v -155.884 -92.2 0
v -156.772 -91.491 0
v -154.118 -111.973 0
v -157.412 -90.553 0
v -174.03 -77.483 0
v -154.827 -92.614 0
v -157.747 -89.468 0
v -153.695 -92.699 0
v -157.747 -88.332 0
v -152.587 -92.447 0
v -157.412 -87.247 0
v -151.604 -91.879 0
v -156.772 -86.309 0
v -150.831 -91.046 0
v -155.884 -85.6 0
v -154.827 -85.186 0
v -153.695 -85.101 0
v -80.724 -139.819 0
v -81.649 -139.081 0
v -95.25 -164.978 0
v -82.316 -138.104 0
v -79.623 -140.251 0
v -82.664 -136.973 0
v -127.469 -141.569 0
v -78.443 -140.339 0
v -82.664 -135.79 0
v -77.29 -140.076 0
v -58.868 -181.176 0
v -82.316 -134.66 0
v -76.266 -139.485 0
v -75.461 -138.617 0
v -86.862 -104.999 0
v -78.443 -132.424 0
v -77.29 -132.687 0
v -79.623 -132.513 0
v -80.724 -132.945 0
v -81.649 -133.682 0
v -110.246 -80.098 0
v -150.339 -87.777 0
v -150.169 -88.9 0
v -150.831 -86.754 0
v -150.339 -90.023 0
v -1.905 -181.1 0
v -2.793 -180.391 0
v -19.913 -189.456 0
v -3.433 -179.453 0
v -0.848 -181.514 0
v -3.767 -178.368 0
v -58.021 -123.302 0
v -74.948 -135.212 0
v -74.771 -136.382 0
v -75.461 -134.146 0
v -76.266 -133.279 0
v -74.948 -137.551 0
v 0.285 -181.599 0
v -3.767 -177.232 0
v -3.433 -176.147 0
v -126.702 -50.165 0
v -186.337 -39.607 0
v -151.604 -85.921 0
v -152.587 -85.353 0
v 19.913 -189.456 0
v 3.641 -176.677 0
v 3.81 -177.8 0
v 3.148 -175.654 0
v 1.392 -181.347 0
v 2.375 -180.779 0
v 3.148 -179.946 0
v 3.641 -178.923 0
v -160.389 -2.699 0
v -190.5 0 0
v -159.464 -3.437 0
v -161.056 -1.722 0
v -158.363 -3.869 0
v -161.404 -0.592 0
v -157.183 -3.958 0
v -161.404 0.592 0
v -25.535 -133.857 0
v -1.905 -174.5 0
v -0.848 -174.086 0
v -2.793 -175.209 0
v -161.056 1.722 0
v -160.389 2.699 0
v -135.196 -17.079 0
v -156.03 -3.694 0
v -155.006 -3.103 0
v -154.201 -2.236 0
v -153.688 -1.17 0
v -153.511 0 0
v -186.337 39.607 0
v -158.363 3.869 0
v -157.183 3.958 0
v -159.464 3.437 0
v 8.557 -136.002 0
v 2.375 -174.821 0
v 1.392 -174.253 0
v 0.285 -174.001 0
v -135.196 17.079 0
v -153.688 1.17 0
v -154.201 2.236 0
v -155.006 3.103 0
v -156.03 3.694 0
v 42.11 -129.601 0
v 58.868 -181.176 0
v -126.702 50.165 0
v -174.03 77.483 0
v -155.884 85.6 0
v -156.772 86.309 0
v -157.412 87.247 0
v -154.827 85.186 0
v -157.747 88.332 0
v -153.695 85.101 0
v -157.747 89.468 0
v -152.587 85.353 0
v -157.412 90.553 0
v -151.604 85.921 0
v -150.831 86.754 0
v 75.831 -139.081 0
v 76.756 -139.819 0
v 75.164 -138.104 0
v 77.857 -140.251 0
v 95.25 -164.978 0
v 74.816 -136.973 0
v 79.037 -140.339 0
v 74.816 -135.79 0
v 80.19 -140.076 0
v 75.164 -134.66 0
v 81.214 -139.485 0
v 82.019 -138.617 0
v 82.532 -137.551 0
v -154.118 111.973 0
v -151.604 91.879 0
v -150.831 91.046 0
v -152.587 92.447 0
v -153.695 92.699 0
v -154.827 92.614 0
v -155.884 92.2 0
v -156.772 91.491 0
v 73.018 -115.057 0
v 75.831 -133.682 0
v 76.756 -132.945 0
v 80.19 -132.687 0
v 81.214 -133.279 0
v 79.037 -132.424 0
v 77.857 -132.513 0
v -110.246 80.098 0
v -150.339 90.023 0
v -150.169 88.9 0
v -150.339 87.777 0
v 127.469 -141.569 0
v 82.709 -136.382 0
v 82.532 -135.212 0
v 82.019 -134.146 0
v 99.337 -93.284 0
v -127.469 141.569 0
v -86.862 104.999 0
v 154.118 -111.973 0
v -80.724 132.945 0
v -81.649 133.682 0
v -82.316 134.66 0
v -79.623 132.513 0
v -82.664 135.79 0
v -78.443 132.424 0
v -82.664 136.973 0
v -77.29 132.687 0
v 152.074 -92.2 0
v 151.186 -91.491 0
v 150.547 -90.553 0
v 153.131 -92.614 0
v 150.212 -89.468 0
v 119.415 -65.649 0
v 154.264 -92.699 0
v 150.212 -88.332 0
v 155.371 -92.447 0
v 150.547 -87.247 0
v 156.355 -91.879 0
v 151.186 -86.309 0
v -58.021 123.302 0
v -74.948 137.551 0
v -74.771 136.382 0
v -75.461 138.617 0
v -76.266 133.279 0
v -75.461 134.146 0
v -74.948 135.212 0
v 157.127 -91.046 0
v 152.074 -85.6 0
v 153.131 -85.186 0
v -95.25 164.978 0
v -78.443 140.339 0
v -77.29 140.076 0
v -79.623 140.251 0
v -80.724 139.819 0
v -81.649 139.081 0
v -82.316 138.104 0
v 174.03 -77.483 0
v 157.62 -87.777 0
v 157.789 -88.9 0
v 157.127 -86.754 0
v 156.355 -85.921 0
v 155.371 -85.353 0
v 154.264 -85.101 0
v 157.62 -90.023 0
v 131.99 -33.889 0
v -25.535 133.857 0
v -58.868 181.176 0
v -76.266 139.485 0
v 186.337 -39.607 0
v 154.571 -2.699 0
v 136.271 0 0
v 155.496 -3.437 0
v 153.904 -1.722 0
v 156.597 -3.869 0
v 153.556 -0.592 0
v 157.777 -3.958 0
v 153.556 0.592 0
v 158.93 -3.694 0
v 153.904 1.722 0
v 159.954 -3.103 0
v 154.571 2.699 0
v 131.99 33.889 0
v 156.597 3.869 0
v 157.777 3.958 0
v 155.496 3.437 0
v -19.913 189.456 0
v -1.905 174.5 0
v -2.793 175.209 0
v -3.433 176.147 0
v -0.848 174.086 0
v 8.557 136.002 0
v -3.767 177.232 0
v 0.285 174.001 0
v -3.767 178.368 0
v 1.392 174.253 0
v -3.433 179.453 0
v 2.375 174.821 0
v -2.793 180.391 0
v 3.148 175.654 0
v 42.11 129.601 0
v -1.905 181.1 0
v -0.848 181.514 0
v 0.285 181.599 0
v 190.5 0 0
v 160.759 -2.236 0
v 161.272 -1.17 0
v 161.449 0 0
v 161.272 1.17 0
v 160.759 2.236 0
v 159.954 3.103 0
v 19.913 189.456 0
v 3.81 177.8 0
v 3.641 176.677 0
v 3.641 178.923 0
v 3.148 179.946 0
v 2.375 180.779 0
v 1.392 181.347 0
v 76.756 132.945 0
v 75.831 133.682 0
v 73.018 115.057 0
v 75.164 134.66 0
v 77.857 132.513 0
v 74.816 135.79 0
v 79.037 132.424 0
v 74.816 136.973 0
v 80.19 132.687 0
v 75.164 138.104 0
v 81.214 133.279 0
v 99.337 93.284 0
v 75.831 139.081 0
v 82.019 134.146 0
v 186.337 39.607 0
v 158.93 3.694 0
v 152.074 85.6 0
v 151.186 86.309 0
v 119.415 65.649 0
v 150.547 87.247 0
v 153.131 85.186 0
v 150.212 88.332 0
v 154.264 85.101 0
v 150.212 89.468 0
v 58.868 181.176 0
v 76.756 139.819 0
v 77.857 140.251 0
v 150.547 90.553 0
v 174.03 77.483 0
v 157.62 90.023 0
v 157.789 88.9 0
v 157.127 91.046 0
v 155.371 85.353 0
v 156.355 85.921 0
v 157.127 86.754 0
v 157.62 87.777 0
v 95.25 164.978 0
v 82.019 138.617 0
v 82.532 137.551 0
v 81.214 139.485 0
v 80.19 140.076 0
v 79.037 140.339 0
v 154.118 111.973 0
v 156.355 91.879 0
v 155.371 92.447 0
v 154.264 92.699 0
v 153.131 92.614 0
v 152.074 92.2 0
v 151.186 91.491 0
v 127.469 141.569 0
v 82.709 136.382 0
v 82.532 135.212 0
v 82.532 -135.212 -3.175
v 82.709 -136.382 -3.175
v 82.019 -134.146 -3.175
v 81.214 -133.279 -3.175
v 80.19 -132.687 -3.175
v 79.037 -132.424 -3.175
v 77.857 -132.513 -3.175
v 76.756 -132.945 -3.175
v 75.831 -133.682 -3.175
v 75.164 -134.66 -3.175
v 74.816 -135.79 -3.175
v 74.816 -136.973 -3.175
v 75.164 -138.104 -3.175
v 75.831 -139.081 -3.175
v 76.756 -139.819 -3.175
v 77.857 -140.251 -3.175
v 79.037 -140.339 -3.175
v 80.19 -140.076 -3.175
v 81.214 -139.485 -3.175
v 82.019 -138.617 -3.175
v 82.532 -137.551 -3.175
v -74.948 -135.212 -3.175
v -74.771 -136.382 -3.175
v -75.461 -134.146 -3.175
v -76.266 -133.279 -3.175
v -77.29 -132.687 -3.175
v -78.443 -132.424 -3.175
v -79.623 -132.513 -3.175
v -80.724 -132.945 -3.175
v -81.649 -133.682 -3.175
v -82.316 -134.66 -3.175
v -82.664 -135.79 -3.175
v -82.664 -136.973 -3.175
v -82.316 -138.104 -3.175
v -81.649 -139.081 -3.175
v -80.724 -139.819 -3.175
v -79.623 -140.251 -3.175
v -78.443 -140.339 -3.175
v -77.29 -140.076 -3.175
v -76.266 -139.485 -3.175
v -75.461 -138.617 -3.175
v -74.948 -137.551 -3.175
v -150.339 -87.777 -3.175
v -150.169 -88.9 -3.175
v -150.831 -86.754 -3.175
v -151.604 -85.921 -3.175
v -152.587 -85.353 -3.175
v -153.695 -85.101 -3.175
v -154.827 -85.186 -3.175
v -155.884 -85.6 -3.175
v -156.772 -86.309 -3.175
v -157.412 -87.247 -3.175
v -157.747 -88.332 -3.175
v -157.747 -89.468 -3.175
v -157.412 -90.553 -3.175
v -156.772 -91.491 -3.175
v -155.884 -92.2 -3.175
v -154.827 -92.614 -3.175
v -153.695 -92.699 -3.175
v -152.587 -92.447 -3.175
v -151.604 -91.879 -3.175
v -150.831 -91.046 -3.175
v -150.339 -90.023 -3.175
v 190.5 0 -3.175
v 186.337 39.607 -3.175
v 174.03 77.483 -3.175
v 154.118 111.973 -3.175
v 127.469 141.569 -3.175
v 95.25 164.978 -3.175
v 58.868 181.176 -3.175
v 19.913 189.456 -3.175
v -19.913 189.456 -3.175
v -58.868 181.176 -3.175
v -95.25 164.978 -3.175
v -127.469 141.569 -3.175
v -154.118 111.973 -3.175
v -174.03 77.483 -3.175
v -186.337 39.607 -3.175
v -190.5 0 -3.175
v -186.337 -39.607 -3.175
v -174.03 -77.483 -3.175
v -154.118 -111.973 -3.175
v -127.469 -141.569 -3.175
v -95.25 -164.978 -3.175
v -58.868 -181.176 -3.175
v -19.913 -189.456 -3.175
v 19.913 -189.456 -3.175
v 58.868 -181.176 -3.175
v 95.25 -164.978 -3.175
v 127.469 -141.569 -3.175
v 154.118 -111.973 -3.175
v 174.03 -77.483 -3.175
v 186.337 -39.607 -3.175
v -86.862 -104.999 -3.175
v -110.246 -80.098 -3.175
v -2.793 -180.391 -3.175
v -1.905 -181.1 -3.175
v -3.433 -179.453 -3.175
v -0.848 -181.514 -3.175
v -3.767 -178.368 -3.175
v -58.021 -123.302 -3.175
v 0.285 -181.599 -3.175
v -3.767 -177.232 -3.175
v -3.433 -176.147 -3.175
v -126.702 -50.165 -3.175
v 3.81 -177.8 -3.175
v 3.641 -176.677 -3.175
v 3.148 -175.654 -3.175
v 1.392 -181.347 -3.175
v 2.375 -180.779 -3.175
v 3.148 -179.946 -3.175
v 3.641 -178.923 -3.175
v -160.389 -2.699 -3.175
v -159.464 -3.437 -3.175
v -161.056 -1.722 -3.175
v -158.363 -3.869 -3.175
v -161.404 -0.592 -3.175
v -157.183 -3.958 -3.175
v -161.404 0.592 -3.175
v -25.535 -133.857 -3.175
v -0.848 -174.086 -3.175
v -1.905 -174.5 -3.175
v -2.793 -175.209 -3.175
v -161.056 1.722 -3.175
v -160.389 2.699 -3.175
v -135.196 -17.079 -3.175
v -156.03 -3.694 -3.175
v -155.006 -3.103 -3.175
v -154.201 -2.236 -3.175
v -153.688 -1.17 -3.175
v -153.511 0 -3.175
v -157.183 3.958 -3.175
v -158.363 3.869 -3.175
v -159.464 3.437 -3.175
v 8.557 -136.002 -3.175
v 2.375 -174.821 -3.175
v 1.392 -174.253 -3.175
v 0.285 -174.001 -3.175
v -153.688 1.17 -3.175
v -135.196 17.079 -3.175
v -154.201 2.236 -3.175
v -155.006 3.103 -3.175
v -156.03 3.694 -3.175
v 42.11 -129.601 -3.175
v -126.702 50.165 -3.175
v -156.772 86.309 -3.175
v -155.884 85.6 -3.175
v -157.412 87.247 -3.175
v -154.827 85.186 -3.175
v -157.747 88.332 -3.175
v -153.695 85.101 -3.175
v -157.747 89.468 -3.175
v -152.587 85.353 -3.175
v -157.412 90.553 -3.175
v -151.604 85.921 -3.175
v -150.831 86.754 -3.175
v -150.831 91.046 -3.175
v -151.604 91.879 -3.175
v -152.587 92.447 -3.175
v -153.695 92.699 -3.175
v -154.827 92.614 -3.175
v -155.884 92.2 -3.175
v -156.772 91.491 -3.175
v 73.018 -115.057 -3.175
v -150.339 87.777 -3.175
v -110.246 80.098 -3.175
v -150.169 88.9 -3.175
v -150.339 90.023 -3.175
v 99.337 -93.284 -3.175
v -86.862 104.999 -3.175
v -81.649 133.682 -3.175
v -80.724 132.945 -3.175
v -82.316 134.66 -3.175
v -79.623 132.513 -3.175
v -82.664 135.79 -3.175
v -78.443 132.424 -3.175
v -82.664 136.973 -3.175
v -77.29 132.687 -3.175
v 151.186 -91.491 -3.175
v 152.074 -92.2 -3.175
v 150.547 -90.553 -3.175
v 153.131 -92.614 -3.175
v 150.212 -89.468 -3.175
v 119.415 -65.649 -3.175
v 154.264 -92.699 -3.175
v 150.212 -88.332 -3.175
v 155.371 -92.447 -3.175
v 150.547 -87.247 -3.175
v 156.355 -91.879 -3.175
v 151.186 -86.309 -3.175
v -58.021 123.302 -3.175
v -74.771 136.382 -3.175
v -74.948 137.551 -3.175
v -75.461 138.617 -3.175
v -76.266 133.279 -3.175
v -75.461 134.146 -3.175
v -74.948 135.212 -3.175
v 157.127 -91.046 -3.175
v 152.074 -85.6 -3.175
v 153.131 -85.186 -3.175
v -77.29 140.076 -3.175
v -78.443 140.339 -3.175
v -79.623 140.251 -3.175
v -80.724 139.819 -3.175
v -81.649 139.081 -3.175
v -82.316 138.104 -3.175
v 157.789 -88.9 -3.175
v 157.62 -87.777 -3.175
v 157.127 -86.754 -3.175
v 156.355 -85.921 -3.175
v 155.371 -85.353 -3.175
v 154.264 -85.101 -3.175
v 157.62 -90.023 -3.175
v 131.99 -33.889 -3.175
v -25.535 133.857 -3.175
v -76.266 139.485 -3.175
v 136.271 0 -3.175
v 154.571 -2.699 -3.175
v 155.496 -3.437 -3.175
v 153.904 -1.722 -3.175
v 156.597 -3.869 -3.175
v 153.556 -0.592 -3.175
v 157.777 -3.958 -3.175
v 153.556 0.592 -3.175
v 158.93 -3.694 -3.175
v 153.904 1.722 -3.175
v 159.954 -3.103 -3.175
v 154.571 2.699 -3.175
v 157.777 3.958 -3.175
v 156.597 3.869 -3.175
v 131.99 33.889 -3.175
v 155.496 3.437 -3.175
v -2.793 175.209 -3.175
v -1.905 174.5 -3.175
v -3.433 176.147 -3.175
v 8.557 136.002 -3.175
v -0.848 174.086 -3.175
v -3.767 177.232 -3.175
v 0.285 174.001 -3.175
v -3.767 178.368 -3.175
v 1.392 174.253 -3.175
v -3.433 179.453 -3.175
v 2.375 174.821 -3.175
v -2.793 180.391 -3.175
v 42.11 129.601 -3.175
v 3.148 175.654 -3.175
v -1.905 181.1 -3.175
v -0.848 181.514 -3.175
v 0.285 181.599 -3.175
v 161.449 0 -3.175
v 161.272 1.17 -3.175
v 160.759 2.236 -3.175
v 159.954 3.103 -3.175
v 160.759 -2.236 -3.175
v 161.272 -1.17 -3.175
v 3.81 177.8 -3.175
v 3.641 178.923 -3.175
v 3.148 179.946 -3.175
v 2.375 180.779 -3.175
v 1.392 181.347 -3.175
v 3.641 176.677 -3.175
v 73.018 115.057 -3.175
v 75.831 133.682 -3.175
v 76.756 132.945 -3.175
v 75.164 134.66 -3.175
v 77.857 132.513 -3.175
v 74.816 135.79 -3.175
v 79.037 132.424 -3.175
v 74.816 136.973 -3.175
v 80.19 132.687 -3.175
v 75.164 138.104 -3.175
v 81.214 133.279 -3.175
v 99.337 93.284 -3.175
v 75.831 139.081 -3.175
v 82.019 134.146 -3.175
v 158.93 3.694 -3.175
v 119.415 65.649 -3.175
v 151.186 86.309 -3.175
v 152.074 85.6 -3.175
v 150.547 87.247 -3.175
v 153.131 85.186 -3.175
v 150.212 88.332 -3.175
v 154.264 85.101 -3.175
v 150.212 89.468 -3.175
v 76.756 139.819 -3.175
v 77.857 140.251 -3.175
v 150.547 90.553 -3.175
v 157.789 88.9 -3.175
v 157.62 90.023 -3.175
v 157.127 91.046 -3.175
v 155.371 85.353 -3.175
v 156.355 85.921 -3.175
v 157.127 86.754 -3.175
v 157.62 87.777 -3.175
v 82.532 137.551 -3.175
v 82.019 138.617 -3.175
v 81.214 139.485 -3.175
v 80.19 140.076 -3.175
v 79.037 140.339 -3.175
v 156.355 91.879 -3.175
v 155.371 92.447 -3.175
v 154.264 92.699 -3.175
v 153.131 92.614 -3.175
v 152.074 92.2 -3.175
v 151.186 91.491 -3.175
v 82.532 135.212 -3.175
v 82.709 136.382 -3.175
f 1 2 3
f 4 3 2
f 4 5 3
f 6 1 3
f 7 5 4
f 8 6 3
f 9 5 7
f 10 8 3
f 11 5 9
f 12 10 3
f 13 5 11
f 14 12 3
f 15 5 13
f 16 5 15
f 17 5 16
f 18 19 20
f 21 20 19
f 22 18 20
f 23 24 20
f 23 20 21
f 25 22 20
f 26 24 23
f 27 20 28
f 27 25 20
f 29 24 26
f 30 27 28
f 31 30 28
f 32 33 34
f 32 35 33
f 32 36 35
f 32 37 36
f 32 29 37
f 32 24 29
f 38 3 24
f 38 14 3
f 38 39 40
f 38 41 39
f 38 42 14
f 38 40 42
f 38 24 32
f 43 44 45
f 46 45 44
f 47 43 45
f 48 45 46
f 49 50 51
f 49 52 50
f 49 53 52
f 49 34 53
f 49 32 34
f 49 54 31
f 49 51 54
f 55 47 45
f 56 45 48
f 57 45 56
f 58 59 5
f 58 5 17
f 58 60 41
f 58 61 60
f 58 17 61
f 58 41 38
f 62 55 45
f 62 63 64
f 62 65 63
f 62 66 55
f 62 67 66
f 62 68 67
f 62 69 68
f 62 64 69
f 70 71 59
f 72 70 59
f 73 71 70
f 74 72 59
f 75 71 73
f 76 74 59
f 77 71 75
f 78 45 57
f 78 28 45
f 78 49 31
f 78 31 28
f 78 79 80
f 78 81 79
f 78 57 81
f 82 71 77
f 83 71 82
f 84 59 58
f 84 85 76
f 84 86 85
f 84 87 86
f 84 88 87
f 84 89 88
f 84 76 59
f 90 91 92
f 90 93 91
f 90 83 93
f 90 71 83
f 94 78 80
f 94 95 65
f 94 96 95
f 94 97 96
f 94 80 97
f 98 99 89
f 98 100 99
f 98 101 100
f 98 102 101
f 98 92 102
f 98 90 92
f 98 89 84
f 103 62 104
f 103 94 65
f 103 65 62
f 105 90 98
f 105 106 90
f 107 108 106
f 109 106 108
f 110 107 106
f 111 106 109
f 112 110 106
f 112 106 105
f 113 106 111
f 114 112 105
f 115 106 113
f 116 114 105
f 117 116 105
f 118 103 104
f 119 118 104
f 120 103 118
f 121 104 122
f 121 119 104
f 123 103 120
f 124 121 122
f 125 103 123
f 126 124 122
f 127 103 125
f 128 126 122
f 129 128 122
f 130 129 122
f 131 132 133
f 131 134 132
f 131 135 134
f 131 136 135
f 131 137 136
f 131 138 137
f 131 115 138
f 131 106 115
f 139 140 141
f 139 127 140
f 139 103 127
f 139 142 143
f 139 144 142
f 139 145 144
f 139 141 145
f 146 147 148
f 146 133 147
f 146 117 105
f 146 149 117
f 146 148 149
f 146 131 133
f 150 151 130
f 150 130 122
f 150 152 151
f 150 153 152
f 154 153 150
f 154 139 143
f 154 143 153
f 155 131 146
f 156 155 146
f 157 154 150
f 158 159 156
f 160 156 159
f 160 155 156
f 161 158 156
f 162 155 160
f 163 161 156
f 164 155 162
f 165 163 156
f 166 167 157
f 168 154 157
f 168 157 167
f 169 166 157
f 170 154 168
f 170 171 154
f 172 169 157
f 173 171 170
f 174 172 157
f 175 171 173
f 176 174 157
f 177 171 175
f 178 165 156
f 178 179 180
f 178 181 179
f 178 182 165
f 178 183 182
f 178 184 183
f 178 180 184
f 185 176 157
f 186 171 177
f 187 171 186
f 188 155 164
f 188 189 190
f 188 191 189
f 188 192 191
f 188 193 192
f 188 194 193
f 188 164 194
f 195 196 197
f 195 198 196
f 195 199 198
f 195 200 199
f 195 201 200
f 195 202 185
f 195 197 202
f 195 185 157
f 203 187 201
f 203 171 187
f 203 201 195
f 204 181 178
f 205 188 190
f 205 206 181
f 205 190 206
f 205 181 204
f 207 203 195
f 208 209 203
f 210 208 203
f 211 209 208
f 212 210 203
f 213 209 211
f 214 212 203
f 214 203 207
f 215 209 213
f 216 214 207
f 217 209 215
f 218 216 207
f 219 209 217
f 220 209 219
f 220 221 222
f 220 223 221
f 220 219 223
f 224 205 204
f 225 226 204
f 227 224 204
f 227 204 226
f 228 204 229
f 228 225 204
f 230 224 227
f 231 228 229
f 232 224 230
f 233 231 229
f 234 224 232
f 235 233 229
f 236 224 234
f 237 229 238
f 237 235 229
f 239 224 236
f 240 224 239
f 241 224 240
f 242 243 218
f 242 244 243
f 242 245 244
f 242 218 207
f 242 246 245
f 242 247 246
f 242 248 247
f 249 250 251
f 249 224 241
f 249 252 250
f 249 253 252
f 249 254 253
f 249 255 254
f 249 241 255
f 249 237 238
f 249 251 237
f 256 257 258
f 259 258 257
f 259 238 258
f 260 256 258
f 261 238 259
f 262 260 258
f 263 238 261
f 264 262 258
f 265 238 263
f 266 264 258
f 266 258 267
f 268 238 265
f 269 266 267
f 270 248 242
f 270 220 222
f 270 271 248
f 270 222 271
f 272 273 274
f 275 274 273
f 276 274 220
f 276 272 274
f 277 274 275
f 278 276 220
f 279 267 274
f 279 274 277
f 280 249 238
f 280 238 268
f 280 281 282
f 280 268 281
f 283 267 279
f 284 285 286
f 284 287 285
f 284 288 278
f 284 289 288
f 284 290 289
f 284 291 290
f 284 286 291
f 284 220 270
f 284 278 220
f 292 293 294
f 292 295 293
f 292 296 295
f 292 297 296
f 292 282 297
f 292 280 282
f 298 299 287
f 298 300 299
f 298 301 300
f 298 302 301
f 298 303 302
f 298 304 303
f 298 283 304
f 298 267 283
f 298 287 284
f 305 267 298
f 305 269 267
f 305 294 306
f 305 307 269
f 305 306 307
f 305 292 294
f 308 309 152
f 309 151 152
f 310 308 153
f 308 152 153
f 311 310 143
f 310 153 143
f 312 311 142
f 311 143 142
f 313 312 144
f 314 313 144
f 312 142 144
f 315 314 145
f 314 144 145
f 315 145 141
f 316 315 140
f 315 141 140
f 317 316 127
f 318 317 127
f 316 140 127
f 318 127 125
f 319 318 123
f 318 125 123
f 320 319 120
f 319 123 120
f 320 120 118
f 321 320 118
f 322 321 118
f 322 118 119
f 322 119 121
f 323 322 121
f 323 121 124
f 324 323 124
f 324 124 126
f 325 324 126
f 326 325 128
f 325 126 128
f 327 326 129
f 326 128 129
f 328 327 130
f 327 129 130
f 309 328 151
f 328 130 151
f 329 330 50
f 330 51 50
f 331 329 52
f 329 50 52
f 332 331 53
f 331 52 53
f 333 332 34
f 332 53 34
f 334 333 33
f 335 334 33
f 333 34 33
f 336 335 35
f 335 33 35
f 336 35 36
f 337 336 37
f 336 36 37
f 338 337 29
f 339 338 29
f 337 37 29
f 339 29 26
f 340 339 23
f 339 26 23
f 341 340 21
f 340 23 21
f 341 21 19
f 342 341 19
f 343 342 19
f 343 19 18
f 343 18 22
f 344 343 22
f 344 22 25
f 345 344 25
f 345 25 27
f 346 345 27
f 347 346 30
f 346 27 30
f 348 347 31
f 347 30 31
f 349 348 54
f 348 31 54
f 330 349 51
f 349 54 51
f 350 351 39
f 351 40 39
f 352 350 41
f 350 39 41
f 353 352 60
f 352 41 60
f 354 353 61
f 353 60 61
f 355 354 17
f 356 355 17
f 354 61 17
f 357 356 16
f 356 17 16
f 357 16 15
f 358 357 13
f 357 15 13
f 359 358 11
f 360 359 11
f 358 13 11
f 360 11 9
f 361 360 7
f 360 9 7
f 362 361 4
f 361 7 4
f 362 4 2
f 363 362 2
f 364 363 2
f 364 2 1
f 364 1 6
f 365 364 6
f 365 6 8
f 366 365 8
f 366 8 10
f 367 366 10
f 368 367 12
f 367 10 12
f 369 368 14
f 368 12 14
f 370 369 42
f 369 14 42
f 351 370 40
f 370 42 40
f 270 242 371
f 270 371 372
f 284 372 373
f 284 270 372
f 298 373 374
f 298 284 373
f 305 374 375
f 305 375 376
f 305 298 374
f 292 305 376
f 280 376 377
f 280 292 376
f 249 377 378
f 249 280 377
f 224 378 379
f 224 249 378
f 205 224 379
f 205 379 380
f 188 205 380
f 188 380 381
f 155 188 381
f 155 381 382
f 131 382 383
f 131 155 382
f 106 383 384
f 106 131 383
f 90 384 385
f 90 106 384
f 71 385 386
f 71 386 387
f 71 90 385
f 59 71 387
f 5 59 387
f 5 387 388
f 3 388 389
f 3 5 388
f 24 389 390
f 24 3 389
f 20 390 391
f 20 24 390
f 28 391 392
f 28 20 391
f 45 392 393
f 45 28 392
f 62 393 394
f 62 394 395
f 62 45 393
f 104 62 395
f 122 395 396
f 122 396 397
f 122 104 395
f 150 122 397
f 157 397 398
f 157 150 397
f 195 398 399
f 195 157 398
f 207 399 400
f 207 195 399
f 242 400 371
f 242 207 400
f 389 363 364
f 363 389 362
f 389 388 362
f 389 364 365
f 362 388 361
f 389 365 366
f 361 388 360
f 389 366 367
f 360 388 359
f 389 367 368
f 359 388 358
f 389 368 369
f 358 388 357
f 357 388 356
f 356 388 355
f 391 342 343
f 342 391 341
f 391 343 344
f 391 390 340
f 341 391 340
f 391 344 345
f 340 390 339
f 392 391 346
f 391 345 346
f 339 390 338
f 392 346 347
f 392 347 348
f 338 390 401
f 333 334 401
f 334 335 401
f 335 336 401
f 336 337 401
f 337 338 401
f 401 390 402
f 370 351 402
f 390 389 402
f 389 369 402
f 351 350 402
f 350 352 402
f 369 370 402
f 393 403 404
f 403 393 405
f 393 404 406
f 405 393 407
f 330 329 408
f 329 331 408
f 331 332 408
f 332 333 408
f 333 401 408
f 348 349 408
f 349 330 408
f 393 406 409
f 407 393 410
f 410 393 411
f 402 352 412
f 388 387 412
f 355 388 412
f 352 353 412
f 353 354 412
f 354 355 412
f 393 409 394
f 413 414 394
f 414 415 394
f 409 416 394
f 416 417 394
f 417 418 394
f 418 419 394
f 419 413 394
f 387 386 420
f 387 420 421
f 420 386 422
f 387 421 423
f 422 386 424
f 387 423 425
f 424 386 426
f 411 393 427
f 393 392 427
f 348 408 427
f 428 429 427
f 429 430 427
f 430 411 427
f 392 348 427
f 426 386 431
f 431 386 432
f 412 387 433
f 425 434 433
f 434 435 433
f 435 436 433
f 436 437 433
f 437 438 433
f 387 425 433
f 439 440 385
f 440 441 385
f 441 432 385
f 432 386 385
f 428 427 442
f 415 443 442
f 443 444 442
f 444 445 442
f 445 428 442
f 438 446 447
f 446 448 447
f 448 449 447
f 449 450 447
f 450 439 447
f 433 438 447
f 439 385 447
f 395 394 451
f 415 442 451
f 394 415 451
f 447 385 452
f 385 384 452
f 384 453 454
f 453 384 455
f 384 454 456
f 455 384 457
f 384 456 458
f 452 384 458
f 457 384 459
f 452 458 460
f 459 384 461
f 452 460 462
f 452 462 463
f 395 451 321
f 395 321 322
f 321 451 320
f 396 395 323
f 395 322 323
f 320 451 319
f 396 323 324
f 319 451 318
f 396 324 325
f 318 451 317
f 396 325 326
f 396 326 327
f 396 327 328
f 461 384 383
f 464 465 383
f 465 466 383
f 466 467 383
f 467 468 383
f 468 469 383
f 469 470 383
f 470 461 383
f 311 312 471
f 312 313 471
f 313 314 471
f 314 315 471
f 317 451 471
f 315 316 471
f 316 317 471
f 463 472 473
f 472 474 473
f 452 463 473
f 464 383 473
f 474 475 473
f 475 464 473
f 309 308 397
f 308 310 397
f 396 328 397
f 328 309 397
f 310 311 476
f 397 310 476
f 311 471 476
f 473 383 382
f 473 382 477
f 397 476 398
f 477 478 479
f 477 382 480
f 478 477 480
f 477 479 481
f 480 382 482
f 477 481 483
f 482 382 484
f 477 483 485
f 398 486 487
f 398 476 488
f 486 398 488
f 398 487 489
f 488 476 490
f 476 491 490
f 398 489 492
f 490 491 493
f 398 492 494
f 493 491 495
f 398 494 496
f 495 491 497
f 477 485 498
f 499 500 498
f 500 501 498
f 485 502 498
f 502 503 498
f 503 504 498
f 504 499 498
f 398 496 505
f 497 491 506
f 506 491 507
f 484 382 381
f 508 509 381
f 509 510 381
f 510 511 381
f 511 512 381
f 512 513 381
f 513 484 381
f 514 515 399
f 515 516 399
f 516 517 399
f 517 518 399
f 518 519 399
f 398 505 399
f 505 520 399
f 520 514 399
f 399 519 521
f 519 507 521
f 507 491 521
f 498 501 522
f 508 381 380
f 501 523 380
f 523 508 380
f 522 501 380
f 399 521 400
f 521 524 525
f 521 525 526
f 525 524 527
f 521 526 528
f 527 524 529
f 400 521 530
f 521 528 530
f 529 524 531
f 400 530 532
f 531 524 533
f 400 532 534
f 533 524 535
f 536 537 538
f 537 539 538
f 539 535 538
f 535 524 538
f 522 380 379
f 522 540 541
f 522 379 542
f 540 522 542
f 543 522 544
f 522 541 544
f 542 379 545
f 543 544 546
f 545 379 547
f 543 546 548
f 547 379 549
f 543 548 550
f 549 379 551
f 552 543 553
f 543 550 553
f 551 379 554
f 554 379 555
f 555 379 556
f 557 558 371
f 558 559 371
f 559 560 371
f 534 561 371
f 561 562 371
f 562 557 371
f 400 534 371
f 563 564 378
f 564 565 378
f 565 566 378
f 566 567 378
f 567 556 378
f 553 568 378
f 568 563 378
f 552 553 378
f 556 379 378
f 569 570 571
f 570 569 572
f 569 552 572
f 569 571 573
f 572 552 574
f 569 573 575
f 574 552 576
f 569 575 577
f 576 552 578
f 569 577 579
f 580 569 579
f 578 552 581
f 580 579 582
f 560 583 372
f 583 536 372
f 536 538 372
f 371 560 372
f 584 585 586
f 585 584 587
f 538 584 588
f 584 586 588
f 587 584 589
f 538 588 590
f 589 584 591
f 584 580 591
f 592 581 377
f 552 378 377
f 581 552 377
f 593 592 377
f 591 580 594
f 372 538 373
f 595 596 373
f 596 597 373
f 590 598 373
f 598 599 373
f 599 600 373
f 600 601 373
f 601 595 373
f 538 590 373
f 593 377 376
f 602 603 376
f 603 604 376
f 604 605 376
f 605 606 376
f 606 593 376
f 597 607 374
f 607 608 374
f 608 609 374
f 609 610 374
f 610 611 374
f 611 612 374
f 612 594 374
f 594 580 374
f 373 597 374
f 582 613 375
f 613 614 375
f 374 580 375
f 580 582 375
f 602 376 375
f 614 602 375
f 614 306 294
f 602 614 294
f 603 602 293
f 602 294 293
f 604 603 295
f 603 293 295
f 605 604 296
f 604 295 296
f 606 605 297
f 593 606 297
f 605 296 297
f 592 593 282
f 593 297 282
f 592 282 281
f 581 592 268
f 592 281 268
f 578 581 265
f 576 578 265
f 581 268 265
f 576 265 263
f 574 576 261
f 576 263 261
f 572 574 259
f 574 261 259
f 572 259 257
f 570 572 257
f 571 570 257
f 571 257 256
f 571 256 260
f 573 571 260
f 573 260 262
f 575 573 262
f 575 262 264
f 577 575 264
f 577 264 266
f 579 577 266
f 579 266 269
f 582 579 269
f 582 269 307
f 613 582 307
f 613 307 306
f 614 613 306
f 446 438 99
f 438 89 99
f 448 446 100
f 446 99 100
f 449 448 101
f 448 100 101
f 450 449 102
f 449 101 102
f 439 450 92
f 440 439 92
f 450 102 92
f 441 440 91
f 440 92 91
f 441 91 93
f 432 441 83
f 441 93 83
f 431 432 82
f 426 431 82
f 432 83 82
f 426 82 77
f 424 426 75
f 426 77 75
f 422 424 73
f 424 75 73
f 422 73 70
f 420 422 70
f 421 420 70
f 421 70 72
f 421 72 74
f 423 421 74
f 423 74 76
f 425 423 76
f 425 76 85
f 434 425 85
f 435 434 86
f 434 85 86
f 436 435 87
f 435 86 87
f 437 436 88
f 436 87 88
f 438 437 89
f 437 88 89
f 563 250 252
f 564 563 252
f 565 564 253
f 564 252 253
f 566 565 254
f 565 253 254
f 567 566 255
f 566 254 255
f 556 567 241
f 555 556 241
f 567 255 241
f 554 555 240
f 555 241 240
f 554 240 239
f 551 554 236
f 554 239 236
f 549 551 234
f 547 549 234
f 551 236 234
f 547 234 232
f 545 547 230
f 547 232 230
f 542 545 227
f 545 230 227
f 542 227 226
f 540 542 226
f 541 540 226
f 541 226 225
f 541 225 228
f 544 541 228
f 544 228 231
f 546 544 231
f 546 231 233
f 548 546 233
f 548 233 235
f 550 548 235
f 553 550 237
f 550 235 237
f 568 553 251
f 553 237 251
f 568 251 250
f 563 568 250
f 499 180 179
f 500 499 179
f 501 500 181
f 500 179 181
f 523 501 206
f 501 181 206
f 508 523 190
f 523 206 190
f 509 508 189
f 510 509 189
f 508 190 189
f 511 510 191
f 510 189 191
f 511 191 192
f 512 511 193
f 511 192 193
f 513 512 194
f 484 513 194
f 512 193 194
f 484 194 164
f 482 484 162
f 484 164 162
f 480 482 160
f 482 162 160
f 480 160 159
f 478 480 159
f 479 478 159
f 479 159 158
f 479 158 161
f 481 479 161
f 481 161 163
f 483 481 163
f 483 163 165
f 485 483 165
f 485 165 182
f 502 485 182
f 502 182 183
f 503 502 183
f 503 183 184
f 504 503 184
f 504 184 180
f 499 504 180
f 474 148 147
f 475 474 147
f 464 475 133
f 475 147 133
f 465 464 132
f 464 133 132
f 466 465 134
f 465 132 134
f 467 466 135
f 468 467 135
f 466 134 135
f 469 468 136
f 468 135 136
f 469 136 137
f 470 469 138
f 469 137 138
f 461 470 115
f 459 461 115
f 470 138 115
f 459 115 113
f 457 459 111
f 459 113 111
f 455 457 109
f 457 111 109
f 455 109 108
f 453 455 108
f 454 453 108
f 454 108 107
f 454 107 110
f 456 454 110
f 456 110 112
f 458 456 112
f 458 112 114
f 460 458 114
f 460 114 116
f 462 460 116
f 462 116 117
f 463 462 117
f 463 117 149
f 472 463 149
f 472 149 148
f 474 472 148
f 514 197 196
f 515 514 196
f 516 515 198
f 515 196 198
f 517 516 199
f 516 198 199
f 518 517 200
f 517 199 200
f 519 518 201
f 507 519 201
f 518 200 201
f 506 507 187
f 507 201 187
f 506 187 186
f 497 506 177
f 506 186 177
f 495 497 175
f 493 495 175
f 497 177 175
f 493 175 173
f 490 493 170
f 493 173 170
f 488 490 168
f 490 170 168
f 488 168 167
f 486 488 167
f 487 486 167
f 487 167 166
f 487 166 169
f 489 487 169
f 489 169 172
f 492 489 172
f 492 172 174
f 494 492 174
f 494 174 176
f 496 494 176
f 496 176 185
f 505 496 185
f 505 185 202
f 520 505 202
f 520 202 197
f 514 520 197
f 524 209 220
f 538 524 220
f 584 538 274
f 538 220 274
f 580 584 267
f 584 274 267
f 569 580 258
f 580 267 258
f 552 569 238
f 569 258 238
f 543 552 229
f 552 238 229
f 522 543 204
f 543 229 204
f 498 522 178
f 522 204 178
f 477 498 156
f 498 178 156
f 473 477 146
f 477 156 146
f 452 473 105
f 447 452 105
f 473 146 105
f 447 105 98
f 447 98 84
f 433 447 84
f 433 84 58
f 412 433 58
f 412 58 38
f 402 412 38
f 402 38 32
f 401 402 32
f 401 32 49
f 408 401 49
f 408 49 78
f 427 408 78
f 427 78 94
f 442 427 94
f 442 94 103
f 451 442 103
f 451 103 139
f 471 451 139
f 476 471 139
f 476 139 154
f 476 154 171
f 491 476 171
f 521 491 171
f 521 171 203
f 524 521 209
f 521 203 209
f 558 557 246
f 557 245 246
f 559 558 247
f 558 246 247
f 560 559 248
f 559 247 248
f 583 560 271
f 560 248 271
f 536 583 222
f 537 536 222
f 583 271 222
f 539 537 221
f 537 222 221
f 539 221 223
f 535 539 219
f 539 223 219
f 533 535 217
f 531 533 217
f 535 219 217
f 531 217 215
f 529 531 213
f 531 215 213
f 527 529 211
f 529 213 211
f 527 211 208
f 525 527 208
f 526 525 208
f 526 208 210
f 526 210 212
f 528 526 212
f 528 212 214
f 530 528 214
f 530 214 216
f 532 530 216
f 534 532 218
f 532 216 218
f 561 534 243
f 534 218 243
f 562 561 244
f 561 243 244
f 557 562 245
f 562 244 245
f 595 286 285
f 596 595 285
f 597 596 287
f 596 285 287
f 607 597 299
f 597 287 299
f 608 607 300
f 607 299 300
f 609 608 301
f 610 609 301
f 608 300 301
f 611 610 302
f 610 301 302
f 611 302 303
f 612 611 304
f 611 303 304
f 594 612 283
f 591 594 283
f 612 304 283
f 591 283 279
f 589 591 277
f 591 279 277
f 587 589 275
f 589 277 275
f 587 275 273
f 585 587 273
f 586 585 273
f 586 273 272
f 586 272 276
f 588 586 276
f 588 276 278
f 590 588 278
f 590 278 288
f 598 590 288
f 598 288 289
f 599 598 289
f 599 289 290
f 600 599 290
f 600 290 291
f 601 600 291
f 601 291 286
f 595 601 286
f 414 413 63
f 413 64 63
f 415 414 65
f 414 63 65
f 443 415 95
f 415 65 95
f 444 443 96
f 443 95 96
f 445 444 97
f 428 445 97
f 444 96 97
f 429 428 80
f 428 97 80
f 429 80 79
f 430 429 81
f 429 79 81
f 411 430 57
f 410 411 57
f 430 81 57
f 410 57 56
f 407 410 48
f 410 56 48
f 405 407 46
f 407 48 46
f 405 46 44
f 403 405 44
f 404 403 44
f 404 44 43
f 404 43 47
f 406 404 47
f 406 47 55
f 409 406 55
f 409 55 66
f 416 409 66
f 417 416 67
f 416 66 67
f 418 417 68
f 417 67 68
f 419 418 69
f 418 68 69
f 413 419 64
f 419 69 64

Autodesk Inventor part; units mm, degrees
ref_plane "YZ Plane" through (0, 0, 0) normal (1, 0, 0) x (0, 1, 0)
ref_plane "XZ Plane" through (0, 0, 0) normal (0, 1, 0) x (-1, 0, 0)
ref_plane "XY Plane" through (0, 0, 0) normal (0, 0, 1) x (1, 0, 0)
sketch "Sketch1" plane through (0, 0, 0) normal (0, 0, 1) x (1, 0, 0)
  circle A0 centre (0, 0) radius 136.271
  circle A1 centre (0, 0) radius 190.5
  dimension "d0" = 272.542
  dimension "d1" = 381
extrude "Extrusion1" add sketch "Sketch1" against normal blind 3.175
sketch "Sketch2" plane through (0, 0, 0) normal (0, 0, 1) x (1, 0, 0)
  circle A0 centre (0, 0) radius 157.48 construction
  circle A1 centre (-157.48, 0) radius 3.9687
  circle A2 centre (-78.74, -136.3817) radius 3.9687
  circle A3 centre (78.74, -136.3817) radius 3.9687
  circle A4 centre (157.48, 0) radius 3.9687
  circle A5 centre (78.74, 136.3817) radius 3.9687
  circle A6 centre (-78.74, 136.3817) radius 3.9687
  dimension "d6" = 314.96
  dimension "d7" = 7.9375
  dimension "d8" = 360
extrude "Extrusion2" cut sketch "Sketch2" against normal through all
sketch "Sketch3" plane through (0, 0, 0) normal (0, 0, 1) x (1, 0, 0)
  line L0 (0, 0) -> (0, -177.8) construction
  line L1 (0, 0) -> (177.8, 0) construction
  circle A0 centre (0, -177.8) radius 3.81
  circle A1 centre (153.9793, -88.9) radius 3.81
  circle A2 centre (153.9793, 88.9) radius 3.81
  circle A3 centre (0, 177.8) radius 3.81
  circle A4 centre (-153.9793, 88.9) radius 3.81
  circle A5 centre (-153.9793, -88.9) radius 3.81
  line L2 (0, 0) -> (0, -177.8) construction
  line L3 (0, 0) -> (177.8, 0) construction
  circle A6 centre (0, -177.8) radius 3.81
  circle A7 centre (153.9793, -88.9) radius 3.81
  circle A8 centre (153.9793, 88.9) radius 3.81
  circle A9 centre (0, 177.8) radius 3.81
  circle A10 centre (-153.9793, 88.9) radius 3.81
  circle A11 centre (-153.9793, -88.9) radius 3.81
  line L4 (0, 0) -> (0, -177.8) construction
  line L5 (0, 0) -> (177.8, 0) construction
  circle A12 centre (0, -177.8) radius 3.81
  circle A13 centre (153.9793, -88.9) radius 3.81
  circle A14 centre (153.9793, 88.9) radius 3.81
  circle A15 centre (0, 177.8) radius 3.81
  circle A16 centre (-153.9793, 88.9) radius 3.81
  circle A17 centre (-153.9793, -88.9) radius 3.81
  dimension "d13" = 177.8
  dimension "d14" = 90
  dimension "d15" = 7.62
  dimension "d16" = 360
  dimension "d19" = 177.8
  dimension "d20" = 90
  dimension "d21" = 7.62
  dimension "d22" = 360
  dimension "d25" = 177.8
  dimension "d26" = 90
  dimension "d27" = 7.62
  dimension "d28" = 360
extrude "Extrusion3" cut sketch "Sketch3" against normal through all
ref_plane "Work Plane1" through (0, 0, 0) normal (0, 0, 1) x (1, 0, 0)
sketch "Sketch4" plane through (0, 0, 0) normal (0, 0, 1) x (1, 0, 0)
  circle A0 centre (0, 0) radius 124.1061 construction
properties part number "Ring Gear Outer"
